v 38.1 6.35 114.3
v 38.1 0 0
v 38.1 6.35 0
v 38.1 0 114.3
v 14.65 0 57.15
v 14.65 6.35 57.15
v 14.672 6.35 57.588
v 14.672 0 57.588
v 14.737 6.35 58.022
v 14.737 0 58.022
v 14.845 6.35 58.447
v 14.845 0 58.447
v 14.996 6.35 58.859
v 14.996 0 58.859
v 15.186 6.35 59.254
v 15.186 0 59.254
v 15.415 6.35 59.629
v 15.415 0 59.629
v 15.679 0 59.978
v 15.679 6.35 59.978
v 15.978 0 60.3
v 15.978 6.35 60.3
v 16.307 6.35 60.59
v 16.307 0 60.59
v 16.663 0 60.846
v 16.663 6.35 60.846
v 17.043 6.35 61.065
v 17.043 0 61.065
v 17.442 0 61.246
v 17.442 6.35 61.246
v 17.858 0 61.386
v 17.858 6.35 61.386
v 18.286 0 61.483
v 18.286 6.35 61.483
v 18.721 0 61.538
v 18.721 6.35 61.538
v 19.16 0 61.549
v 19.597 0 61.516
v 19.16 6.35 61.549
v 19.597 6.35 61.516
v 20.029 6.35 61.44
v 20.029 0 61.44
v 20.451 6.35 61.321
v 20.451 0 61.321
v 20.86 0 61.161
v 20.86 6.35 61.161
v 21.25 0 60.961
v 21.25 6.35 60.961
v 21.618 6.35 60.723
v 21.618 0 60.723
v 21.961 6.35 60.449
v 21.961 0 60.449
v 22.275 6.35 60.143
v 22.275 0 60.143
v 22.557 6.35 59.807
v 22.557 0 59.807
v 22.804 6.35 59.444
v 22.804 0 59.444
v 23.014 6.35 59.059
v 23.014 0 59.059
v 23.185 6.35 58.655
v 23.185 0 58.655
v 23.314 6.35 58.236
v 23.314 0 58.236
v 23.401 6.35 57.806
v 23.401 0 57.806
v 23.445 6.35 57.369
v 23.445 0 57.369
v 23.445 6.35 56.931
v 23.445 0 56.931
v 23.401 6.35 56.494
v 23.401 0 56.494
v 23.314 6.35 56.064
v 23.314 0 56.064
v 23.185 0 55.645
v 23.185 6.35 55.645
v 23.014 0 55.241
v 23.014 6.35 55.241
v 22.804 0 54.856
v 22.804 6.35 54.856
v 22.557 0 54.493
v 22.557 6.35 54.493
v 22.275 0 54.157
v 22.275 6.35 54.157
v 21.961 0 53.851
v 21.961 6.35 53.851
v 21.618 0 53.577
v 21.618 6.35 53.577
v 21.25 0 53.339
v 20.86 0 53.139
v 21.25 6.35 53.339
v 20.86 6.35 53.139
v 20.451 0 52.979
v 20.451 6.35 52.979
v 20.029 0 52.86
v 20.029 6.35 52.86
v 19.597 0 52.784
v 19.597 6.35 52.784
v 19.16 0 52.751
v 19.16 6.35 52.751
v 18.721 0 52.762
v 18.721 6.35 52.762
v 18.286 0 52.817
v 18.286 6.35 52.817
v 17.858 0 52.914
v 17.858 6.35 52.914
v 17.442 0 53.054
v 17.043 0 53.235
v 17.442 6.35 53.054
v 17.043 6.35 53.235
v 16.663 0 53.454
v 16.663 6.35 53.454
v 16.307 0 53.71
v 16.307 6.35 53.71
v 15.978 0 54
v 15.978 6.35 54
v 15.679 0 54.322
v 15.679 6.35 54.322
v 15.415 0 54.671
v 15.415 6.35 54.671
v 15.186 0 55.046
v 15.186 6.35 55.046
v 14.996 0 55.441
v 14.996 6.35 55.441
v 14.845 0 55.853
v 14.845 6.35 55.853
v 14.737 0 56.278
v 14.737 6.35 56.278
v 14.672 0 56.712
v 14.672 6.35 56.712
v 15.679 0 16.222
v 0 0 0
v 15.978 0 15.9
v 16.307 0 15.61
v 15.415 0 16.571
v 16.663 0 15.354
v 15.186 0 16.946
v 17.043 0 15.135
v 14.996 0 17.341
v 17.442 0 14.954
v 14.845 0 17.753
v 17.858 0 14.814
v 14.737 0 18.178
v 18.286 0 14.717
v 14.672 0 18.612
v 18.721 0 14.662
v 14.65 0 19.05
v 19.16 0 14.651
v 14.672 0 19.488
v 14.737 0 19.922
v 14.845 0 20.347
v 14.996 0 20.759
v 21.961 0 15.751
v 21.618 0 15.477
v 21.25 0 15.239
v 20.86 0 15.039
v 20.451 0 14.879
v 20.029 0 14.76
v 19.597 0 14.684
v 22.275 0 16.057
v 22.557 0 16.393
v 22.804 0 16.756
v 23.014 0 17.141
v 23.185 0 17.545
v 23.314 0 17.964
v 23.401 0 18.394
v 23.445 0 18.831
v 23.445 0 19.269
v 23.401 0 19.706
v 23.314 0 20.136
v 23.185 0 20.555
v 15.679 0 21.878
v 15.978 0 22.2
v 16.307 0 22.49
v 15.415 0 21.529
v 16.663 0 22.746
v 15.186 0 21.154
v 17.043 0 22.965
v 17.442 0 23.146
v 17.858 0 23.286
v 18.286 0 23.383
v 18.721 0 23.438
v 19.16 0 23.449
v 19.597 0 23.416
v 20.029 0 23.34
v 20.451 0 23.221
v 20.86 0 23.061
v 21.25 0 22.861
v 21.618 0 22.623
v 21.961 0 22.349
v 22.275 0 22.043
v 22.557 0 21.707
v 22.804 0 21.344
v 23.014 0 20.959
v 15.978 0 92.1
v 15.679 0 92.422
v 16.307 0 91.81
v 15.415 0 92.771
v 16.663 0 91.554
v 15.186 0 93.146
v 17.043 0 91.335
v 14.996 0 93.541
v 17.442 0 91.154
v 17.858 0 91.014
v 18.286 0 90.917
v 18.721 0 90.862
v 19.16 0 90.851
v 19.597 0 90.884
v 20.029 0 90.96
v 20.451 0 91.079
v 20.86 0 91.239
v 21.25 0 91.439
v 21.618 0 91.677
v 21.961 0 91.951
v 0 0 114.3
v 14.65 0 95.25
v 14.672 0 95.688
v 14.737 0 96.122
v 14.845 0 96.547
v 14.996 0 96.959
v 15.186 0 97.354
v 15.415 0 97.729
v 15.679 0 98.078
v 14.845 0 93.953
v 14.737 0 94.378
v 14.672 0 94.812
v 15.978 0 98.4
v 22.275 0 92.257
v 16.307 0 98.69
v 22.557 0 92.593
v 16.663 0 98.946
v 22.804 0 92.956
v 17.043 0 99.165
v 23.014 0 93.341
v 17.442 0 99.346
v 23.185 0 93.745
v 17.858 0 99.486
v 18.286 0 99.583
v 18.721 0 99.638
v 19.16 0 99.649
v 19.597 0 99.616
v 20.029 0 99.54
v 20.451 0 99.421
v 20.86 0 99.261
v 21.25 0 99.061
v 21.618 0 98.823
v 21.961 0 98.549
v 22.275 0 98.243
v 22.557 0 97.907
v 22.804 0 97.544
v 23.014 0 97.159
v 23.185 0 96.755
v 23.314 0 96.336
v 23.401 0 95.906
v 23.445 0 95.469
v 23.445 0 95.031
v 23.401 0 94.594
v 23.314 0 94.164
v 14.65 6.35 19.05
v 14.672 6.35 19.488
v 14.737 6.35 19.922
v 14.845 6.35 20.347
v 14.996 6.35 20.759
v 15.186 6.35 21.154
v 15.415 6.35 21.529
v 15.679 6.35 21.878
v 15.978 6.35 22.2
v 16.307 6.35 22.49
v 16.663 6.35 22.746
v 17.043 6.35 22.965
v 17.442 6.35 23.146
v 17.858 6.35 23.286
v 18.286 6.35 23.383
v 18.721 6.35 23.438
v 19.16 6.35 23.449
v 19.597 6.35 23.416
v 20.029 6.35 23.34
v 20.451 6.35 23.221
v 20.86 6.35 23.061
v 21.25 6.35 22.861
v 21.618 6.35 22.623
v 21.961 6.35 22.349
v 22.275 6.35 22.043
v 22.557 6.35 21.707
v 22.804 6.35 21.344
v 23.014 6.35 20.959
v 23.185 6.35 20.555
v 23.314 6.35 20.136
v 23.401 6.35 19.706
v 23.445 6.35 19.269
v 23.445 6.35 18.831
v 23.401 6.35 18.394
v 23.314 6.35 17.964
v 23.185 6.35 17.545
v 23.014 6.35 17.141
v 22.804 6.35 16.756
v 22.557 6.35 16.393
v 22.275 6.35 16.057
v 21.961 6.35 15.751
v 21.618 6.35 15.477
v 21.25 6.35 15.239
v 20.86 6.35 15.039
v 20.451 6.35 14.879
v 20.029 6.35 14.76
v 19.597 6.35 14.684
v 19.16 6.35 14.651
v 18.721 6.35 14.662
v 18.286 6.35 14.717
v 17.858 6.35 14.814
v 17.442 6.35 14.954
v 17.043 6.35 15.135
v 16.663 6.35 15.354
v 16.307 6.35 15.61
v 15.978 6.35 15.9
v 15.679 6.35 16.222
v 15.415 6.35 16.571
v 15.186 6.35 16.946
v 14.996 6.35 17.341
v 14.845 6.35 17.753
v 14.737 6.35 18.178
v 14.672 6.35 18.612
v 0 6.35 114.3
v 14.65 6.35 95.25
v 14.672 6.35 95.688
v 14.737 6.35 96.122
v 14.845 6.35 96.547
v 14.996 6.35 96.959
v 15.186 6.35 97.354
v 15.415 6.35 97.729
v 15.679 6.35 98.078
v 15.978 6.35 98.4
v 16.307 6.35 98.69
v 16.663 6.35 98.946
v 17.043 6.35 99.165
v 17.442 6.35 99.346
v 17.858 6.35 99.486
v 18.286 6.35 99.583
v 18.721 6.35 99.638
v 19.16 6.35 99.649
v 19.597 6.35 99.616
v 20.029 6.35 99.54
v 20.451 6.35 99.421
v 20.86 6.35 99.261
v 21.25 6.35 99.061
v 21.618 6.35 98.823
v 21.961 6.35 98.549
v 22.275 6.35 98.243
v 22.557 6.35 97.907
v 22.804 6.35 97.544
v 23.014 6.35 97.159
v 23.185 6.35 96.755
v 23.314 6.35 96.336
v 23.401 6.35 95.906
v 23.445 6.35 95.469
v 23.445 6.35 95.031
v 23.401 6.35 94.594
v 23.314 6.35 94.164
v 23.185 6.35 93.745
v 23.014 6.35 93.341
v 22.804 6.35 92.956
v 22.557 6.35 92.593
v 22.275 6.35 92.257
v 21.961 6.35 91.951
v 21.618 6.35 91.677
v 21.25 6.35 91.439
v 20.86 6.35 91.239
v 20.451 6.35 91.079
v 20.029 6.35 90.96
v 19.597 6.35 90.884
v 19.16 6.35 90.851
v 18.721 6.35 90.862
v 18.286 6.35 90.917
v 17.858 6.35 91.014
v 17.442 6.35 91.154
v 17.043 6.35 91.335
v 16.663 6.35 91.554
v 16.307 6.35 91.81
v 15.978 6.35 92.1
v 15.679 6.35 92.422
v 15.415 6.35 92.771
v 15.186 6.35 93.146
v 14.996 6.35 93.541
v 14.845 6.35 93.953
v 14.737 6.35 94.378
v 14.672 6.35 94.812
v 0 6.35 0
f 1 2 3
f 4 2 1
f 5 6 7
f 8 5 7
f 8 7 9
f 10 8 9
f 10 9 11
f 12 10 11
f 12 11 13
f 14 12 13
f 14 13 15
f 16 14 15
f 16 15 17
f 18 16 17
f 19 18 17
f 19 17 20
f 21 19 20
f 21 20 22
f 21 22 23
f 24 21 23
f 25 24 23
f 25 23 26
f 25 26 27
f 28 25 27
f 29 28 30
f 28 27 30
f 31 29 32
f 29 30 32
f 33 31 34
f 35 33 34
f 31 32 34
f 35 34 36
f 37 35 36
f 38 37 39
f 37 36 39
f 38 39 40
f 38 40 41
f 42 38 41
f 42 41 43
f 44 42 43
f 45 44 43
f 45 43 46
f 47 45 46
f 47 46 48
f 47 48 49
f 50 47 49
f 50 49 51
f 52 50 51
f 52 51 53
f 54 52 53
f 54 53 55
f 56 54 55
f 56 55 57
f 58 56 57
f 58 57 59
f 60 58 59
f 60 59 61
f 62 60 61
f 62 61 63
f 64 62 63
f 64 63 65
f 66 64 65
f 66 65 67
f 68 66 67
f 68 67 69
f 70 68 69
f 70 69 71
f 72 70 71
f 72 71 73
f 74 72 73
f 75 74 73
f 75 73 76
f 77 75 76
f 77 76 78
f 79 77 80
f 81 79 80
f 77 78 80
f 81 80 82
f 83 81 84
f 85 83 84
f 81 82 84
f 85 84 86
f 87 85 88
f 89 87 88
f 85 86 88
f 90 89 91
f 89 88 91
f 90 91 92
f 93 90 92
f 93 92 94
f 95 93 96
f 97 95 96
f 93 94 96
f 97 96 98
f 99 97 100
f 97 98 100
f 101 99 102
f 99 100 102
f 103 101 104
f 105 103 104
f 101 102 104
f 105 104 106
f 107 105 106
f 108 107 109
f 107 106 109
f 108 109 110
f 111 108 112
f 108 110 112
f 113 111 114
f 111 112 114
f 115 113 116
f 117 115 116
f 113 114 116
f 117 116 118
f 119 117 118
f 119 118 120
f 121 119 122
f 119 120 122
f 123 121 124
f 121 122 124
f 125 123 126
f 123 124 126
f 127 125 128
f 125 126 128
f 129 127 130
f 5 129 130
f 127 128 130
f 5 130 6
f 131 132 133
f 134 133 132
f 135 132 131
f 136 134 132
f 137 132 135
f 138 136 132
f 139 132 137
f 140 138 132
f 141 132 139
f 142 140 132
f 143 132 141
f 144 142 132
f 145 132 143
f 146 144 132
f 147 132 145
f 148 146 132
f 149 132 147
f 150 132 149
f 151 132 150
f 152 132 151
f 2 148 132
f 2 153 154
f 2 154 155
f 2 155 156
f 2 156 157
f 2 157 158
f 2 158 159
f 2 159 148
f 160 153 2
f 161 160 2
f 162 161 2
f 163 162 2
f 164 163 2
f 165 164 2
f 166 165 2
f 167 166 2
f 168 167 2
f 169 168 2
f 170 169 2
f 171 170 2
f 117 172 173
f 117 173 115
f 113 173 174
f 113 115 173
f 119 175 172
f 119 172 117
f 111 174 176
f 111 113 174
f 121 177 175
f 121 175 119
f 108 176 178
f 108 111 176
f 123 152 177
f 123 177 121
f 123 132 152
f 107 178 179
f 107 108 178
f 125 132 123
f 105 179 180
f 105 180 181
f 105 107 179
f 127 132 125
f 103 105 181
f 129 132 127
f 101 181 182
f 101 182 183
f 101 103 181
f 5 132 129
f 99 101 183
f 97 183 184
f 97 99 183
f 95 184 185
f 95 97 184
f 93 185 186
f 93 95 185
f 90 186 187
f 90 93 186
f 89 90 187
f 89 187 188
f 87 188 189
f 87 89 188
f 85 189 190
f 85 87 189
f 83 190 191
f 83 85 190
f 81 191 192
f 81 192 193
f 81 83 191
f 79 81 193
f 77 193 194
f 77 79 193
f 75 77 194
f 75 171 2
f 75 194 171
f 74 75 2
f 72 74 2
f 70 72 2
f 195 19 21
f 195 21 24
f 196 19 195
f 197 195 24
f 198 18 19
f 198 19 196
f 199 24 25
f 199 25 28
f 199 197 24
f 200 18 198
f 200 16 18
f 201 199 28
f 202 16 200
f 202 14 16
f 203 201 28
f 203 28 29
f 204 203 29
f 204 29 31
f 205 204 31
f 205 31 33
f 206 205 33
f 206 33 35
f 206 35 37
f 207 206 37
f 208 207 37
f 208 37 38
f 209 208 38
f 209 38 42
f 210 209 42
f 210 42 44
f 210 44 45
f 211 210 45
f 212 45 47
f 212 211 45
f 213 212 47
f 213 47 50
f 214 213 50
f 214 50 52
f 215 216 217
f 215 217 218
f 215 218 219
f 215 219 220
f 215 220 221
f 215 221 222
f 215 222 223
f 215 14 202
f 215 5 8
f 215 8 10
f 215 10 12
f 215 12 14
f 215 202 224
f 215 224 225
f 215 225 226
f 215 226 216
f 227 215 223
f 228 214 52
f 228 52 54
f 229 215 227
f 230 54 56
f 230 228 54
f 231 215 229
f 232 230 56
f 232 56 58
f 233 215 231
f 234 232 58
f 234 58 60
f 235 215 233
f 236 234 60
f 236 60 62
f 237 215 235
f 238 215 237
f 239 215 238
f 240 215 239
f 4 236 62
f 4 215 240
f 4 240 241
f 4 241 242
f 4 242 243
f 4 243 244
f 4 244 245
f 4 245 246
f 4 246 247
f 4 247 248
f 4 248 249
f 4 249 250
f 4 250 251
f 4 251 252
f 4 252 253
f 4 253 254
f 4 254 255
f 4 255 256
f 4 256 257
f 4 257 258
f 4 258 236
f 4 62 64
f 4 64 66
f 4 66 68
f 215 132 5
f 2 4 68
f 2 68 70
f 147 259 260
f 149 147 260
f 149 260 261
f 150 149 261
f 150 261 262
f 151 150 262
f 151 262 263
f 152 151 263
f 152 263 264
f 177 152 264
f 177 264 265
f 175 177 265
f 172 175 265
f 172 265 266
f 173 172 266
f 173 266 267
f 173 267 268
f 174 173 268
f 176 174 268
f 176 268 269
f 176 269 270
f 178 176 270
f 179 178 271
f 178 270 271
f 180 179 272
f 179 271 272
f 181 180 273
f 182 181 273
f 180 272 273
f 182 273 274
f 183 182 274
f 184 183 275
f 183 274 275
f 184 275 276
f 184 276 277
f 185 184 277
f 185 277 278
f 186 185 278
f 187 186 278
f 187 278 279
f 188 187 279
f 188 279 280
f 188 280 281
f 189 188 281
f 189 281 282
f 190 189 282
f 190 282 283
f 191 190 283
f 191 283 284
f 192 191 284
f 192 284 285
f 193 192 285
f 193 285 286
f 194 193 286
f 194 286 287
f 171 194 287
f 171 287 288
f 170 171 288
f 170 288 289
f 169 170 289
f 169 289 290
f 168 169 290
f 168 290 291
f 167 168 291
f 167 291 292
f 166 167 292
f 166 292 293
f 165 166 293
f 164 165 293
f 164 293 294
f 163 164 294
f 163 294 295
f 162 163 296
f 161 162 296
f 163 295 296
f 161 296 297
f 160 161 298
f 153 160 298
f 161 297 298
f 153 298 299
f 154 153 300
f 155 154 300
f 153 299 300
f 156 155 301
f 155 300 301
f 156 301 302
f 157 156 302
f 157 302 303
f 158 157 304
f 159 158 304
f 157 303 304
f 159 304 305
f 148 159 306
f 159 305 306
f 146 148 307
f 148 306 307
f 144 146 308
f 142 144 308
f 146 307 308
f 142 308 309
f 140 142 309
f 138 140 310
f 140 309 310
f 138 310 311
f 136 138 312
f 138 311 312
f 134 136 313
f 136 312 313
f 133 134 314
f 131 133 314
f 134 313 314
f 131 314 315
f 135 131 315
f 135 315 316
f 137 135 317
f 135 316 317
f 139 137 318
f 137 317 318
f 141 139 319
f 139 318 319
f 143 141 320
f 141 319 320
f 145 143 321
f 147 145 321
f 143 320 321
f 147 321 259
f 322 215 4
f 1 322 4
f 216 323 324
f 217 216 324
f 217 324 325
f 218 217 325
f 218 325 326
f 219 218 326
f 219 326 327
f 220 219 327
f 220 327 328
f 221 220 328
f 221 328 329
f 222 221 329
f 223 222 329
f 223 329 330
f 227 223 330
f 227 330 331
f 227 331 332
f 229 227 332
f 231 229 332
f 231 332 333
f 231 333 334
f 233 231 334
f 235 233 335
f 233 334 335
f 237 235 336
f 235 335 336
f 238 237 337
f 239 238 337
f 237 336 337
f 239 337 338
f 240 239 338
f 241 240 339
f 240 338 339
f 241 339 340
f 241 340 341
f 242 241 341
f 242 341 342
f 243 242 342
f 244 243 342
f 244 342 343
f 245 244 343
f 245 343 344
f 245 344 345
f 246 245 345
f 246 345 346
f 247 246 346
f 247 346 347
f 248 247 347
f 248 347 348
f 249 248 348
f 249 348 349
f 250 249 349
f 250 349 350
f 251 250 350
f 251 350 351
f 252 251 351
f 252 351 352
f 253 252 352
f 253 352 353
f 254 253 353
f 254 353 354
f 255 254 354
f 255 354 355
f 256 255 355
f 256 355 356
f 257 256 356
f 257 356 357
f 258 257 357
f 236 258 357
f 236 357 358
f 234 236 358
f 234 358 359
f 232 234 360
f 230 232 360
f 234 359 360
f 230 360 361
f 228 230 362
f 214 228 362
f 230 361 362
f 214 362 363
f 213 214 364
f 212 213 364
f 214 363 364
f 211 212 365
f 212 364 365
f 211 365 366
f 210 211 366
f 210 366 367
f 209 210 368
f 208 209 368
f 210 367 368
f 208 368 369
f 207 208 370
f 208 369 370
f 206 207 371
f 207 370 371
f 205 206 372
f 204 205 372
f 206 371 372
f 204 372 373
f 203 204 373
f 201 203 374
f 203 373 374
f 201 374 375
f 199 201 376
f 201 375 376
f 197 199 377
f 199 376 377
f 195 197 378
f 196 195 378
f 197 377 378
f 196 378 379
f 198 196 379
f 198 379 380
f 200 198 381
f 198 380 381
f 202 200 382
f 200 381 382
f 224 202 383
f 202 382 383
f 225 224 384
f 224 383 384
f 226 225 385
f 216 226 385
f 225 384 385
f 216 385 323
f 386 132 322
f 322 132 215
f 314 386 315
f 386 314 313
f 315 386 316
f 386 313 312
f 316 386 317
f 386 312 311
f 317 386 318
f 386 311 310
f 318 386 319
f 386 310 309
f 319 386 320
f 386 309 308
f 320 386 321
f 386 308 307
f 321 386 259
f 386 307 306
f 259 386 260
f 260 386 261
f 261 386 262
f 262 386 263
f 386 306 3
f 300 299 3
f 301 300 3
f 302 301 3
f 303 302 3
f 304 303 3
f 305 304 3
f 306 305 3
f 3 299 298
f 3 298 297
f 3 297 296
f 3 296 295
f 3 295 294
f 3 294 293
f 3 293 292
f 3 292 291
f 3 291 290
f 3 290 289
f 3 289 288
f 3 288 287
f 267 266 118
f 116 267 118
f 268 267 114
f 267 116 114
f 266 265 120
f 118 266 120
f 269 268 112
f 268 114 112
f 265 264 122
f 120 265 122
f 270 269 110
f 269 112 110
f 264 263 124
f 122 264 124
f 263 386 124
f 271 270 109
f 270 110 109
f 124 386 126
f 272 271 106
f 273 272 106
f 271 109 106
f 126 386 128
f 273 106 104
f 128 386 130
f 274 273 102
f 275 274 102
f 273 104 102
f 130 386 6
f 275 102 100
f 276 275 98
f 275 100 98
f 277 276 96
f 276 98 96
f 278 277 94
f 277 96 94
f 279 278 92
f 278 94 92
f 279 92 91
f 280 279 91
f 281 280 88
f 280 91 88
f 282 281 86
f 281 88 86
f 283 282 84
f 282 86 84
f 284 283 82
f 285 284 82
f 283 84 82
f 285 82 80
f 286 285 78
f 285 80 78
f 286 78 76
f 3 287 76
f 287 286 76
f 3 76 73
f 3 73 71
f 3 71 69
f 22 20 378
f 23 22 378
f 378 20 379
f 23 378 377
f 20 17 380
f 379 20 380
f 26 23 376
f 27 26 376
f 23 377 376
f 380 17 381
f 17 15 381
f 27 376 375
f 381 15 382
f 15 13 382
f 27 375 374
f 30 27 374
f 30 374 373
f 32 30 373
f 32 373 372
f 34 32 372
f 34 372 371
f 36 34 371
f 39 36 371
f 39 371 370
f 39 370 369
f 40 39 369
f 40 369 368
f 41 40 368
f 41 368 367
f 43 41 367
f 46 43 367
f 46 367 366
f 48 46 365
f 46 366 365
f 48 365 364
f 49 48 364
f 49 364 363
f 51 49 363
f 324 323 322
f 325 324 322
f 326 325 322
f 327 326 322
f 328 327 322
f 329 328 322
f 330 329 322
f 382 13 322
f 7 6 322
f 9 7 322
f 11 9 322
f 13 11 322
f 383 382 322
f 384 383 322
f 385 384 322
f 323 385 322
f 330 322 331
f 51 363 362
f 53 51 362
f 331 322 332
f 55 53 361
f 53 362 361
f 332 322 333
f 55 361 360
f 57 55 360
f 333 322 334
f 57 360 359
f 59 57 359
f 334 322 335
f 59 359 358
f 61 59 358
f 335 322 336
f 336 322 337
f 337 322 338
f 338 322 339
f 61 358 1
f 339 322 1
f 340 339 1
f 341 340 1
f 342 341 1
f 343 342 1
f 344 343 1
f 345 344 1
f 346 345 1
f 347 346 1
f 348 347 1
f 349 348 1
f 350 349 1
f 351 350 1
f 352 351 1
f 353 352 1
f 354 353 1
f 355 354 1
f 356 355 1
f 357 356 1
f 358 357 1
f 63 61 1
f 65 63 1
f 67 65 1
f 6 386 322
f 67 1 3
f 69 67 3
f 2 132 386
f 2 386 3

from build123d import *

# Parameters (mm, degrees)
F0_W     = 38.1
F0_H     = 114.3
F1_DEPTH = 6.35
F2_D     = 8.8


# Not quite as in the source:
# - a length typed as a fraction of an inch, garbled in the dataset ("3 / 203.2 mm" for 3/8 in), is restored
# - a feature names something its author has since deleted; it is built from what else it names


with BuildPart() as f1:
    # F0 (on Front) → F1 (new body)
    with BuildSketch(Plane.XZ):
        with Locations((19.05, 57.15)):
            Rectangle(F0_W, F0_H)
    extrude(amount=-F1_DEPTH)

    # F2 (through all)
    with Locations(Plane.XZ):
        with Locations((19.05, 95.25), (19.05, 57.15), (19.05, 19.05)):
            Hole(F2_D / 2)


solid = f1.part
